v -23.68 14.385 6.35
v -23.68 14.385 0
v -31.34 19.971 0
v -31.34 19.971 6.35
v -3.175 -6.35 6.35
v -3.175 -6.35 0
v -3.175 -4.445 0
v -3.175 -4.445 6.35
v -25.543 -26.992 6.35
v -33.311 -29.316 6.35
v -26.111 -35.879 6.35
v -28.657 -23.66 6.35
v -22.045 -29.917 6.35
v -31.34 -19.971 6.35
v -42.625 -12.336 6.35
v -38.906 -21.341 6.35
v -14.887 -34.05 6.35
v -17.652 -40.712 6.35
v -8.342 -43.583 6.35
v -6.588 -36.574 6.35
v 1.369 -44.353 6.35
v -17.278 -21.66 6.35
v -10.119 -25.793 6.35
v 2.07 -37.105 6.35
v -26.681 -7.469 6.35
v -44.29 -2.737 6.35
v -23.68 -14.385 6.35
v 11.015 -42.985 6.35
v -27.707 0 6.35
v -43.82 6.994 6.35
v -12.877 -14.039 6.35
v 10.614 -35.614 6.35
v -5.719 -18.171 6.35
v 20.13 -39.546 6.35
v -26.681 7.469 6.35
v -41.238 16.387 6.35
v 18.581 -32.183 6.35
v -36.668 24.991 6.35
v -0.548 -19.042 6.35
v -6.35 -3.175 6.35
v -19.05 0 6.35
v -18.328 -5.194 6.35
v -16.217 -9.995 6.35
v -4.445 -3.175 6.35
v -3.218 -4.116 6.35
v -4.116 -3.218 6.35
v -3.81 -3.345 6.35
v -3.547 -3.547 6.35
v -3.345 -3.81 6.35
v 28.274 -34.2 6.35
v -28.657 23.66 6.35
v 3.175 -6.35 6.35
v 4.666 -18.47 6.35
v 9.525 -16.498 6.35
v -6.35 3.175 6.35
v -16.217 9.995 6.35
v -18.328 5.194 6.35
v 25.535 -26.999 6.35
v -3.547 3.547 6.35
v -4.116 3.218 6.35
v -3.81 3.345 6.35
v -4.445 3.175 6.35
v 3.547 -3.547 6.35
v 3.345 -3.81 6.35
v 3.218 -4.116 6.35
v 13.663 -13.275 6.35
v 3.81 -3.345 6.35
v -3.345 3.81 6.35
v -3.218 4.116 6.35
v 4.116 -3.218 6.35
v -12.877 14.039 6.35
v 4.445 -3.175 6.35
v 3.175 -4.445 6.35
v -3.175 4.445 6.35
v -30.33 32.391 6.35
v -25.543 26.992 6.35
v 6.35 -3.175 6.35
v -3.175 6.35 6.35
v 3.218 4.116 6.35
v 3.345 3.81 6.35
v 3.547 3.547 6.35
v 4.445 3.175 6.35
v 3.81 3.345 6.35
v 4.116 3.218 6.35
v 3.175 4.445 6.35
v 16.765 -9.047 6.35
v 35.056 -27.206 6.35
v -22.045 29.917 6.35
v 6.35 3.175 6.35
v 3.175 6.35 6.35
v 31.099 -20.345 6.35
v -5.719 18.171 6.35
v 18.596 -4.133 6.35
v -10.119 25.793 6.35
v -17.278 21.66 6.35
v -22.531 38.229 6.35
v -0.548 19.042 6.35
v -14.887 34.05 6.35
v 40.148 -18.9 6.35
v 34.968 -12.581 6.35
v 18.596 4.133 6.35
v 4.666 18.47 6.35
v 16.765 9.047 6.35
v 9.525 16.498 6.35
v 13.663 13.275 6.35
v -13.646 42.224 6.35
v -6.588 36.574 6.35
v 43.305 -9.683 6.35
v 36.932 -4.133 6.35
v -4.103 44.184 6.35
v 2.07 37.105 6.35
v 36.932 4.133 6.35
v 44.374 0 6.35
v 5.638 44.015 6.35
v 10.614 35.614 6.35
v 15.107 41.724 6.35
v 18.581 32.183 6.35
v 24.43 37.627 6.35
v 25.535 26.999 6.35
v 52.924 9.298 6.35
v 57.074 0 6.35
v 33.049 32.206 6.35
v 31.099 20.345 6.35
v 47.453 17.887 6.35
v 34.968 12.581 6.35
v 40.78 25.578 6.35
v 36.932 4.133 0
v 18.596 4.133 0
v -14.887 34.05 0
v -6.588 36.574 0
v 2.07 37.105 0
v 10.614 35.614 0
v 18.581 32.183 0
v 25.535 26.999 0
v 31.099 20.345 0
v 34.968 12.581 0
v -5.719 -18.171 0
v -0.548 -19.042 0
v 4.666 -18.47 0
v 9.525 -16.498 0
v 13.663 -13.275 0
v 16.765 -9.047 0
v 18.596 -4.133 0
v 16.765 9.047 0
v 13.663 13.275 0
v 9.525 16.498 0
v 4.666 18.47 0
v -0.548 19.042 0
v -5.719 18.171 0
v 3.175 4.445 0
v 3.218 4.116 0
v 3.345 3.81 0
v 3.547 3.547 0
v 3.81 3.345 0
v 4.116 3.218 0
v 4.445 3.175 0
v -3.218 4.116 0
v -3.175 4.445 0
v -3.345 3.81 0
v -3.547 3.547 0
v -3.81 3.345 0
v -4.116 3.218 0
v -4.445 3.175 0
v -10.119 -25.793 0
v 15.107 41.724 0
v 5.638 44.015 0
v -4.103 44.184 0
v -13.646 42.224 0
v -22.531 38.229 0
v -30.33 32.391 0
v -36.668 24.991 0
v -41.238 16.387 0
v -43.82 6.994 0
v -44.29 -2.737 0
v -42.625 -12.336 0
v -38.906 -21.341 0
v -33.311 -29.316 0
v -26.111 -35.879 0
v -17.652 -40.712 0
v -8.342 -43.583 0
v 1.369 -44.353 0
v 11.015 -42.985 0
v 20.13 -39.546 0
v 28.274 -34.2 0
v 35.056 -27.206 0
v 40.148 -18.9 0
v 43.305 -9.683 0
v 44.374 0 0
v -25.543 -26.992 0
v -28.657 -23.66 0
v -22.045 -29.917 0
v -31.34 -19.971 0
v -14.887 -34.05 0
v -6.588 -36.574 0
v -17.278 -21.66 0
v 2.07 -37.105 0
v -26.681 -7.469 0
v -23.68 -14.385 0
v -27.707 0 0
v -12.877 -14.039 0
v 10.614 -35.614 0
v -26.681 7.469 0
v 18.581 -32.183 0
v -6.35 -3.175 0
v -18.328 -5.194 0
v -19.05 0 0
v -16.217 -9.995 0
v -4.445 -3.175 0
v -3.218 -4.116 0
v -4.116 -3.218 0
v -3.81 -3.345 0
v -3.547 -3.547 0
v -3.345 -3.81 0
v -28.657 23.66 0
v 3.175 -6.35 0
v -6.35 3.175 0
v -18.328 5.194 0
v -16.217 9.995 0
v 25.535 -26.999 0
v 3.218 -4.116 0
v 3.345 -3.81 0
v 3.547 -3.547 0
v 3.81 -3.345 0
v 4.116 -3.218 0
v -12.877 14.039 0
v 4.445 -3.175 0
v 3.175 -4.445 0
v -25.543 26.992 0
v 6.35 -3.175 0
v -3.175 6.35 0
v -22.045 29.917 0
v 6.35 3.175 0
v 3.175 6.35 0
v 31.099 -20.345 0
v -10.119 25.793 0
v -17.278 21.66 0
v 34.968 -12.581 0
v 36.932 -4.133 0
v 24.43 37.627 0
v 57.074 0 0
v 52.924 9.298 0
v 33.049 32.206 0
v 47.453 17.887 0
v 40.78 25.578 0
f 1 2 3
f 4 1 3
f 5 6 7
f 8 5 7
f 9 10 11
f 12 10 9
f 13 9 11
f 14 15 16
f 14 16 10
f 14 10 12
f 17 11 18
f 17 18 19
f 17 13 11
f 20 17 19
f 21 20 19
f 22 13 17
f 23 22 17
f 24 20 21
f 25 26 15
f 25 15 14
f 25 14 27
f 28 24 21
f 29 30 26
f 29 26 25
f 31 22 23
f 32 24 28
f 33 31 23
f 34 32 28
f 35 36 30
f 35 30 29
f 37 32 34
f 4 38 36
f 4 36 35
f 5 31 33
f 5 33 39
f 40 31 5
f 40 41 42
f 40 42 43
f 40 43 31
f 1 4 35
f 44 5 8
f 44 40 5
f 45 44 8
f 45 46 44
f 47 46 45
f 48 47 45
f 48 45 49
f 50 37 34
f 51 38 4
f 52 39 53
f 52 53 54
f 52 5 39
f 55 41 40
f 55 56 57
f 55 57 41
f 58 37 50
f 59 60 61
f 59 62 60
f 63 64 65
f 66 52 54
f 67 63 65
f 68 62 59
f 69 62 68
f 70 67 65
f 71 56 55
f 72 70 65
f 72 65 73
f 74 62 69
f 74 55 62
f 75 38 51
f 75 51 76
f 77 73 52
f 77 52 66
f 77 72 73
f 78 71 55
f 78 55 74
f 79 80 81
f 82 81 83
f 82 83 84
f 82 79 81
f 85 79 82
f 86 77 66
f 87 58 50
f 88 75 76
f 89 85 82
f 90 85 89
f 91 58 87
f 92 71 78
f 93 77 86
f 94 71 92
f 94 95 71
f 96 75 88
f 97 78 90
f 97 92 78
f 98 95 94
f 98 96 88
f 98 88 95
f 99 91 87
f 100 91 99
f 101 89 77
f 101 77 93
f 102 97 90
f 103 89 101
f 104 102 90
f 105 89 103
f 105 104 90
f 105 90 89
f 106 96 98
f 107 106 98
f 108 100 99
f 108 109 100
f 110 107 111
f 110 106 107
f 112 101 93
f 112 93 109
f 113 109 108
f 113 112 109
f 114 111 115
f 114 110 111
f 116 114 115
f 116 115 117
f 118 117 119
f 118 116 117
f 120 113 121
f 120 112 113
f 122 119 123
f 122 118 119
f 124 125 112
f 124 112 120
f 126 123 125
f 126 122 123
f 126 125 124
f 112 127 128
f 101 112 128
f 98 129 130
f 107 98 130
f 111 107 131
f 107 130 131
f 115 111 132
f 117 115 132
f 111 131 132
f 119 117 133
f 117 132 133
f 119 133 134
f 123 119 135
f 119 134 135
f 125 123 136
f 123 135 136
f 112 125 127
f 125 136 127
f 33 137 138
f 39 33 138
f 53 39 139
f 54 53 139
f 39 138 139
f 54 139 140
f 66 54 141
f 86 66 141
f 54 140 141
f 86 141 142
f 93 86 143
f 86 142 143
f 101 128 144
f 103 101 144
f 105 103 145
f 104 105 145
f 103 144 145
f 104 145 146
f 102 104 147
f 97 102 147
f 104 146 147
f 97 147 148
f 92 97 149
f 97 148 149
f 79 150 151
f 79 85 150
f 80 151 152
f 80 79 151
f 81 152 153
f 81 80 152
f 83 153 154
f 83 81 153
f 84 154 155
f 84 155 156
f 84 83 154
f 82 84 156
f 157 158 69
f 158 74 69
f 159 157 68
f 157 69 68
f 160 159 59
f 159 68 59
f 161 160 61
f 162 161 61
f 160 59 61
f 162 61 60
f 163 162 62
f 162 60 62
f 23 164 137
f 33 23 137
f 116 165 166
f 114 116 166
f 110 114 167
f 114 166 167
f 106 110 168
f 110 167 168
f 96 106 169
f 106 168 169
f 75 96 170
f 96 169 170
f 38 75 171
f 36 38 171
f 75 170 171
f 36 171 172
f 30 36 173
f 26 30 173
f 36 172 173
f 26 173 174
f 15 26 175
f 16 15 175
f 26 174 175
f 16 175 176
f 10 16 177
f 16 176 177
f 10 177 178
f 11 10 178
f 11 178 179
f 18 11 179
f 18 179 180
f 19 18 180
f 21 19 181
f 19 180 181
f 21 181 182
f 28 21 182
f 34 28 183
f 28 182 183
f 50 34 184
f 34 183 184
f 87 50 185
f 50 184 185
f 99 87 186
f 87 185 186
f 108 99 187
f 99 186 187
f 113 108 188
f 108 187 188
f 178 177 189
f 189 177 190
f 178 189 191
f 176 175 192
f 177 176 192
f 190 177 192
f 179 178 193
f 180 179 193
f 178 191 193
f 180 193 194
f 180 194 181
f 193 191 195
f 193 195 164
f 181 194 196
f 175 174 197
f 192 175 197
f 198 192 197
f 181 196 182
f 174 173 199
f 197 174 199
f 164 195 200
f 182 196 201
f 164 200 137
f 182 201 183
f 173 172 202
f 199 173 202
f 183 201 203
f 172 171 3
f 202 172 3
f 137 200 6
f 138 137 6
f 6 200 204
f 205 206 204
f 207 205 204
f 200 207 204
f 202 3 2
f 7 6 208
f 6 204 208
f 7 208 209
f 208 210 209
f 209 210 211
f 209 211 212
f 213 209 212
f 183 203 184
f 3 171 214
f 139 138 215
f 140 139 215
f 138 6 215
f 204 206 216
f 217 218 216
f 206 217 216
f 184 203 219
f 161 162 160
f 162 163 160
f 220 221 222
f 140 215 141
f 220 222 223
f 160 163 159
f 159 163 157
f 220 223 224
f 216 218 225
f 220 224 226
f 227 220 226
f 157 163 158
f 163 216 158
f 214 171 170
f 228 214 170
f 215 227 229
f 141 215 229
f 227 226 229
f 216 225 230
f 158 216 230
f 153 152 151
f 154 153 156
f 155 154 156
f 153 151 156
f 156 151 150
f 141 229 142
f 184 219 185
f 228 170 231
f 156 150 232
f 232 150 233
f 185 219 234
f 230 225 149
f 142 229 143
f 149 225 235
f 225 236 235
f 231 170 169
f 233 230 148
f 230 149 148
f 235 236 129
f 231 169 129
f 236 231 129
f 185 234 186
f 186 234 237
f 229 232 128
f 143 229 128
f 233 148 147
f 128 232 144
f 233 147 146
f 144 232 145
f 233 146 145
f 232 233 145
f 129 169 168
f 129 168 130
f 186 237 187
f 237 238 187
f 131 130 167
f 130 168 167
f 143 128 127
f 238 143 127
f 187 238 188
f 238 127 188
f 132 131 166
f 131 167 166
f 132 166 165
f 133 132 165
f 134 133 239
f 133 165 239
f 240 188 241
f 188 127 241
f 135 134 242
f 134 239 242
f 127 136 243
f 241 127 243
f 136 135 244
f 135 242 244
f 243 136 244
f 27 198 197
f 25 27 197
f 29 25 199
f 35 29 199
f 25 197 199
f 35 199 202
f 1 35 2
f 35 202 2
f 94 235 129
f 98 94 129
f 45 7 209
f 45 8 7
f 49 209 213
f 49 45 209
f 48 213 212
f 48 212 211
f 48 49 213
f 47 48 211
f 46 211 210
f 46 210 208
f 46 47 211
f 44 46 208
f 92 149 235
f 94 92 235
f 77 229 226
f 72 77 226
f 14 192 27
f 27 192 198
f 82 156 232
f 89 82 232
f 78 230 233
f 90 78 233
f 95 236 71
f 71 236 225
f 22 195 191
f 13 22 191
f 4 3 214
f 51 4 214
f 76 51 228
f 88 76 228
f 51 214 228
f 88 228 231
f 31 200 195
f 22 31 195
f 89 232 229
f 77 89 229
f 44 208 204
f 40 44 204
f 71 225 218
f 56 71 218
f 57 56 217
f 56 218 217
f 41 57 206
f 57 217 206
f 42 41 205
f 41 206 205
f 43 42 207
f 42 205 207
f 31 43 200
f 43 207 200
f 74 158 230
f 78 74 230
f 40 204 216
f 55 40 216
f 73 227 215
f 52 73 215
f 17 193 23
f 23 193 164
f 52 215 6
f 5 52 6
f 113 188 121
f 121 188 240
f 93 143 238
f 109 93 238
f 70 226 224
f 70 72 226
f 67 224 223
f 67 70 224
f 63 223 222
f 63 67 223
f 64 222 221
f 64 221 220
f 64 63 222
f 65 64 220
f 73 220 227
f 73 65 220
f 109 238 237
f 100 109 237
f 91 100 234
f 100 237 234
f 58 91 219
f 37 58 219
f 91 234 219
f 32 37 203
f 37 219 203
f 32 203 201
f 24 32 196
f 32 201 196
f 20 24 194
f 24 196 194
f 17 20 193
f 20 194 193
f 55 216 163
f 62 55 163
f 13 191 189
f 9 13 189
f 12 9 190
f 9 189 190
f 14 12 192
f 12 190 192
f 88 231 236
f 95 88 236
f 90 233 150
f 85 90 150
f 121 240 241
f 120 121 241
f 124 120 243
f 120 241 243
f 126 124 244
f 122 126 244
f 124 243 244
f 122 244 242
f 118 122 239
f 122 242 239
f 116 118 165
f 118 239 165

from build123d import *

# Parameters (mm, degrees)
F1_DEPTH = 6.35
F2_R     = 1.27


with BuildPart() as f1:
    # F0 (on Top) → F1 (new body)
    with BuildSketch(Plane.XY):
        with BuildLine():
            ThreePointArc((15.1071694838, 41.7235677075), (-36.3280432516, -25.4824634909), (44.3743470042, 0))
            ThreePointArc((44.3743470042, 0), (36.3280432516, 25.4824634909), (15.1071694838, 41.7235677075))
        make_face()
        with BuildLine():
            ThreePointArc((-14.8868357383, 34.0501787057), (18.5811231374, 32.1834493357), (36.9317376317, 4.1327114215))
            ThreePointArc((36.9317376317, 4.1327114215), (37.1045743636, 2.0695674625), (37.1622462748, 0))
            ThreePointArc((37.1622462748, 0), (37.1045743636, -2.0695674625), (36.9317376317, -4.1327114215))
            ThreePointArc((36.9317376317, -4.1327114215), (18.5811231374, -32.1834493357), (-14.8868357383, -34.0501787057))
            ThreePointArc((-14.8868357383, -34.0501787057), (-18.5811231374, -32.1834493357), (-22.0449018934, -29.9174672842))
            ThreePointArc((-22.0449018934, -29.9174672842), (-27.1515852785, -25.3736864695), (-31.3396552702, -19.9714435065))
            ThreePointArc((-31.3396552702, -19.9714435065), (-37.1622462748, 0), (-31.3396552702, 19.9714435065))
            ThreePointArc((-31.3396552702, 19.9714435065), (-27.1515852785, 25.3736864695), (-22.0449018934, 29.9174672842))
            ThreePointArc((-22.0449018934, 29.9174672842), (-18.5811231374, 32.1834493357), (-14.8868357383, 34.0501787057))
        make_face(mode=Mode.SUBTRACT)
        with BuildLine():
            ThreePointArc((15.1071694838, 41.7235677075), (36.3280432516, 25.4824634909), (44.3743470042, 0))
            Line((44.3743470042, 0), (57.0743470042, 0))
            ThreePointArc((57.0743470042, 0), (40.7796227308, 25.5780250359), (15.1071694838, 41.7235677075))
        make_face()
        with BuildLine():
            ThreePointArc((-9.525, 16.4977839421), (-7.6678534057, 17.4386502961), (-5.7191279813, 18.1712430817))
            Line((-5.7191279813, 18.1712430817), (-10.11946405, 25.792848723))
            ThreePointArc((-10.11946405, 25.792848723), (-13.8534706654, 23.9949150536), (-17.2775302051, 21.6601373015))
            Line((-17.2775302051, 21.6601373015), (-12.8771941364, 14.0385316602))
            ThreePointArc((-12.8771941364, 14.0385316602), (-11.2683874613, 15.3598809898), (-9.525, 16.4977839421))
        make_face()
        with BuildLine():
            ThreePointArc((-17.2775302051, 21.6601373015), (-13.8534706654, 23.9949150536), (-10.11946405, 25.792848723))
            Line((-10.11946405, 25.792848723), (-14.8868357383, 34.0501787057))
            ThreePointArc((-14.8868357383, 34.0501787057), (-18.5811231374, 32.1834493357), (-22.0449018934, 29.9174672842))
            Line((-22.0449018934, 29.9174672842), (-17.2775302051, 21.6601373015))
        make_face()
        with BuildLine():
            Line((-10.11946405, -25.792848723), (-5.7191279813, -18.1712430817))
            ThreePointArc((-5.7191279813, -18.1712430817), (-7.6678534057, -17.4386502961), (-9.525, -16.4977839421))
            ThreePointArc((-9.525, -16.4977839421), (-11.2683874613, -15.3598809898), (-12.8771941364, -14.0385316602))
            Line((-12.8771941364, -14.0385316602), (-17.2775302051, -21.6601373015))
            ThreePointArc((-17.2775302051, -21.6601373015), (-13.8534706654, -23.9949150536), (-10.11946405, -25.792848723))
        make_face()
        with BuildLine():
            Line((-14.8868357383, -34.0501787057), (-10.11946405, -25.792848723))
            ThreePointArc((-10.11946405, -25.792848723), (-13.8534706654, -23.9949150536), (-17.2775302051, -21.6601373015))
            Line((-17.2775302051, -21.6601373015), (-22.0449018934, -29.9174672842))
            ThreePointArc((-22.0449018934, -29.9174672842), (-18.5811231374, -32.1834493357), (-14.8868357383, -34.0501787057))
        make_face()
        with BuildLine():
            ThreePointArc((18.5963221177, 4.1327114215), (18.936240867, 2.0787693062), (19.05, 0))
            ThreePointArc((19.05, 0), (18.936240867, -2.0787693062), (18.5963221177, -4.1327114215))
            Line((18.5963221177, -4.1327114215), (27.3969942551, -4.1327114215))
            ThreePointArc((27.3969942551, -4.1327114215), (27.6293459059, -2.0721589516), (27.7069413308, 0))
            ThreePointArc((27.7069413308, 0), (27.6293459059, 2.0721589516), (27.3969942551, 4.1327114215))
            Line((27.3969942551, 4.1327114215), (18.5963221177, 4.1327114215))
        make_face()
        with BuildLine():
            Line((36.9317376317, 4.1327114215), (27.3969942551, 4.1327114215))
            ThreePointArc((27.3969942551, 4.1327114215), (27.6293459059, 2.0721589516), (27.7069413308, 0))
            ThreePointArc((27.7069413308, 0), (27.6293459059, -2.0721589516), (27.3969942551, -4.1327114215))
            Line((27.3969942551, -4.1327114215), (36.9317376317, -4.1327114215))
            ThreePointArc((36.9317376317, -4.1327114215), (37.1045743636, -2.0695674625), (37.1622462748, 0))
            ThreePointArc((37.1622462748, 0), (37.1045743636, 2.0695674625), (36.9317376317, 4.1327114215))
        make_face()
        with BuildLine():
            ThreePointArc((18.5963221177, -4.1327114215), (18.936240867, -2.0787693062), (19.05, 0))
            ThreePointArc((19.05, 0), (18.936240867, 2.0787693062), (18.5963221177, 4.1327114215))
            ThreePointArc((18.5963221177, 4.1327114215), (9.525, 16.4977839421), (-5.7191279813, 18.1712430817))
            ThreePointArc((-5.7191279813, 18.1712430817), (-7.6678534057, 17.4386502961), (-9.525, 16.4977839421))
            ThreePointArc((-9.525, 16.4977839421), (-11.2683874613, 15.3598809898), (-12.8771941364, 14.0385316602))
            ThreePointArc((-12.8771941364, 14.0385316602), (-19.05, 0), (-12.8771941364, -14.0385316602))
            ThreePointArc((-12.8771941364, -14.0385316602), (-11.2683874613, -15.3598809898), (-9.525, -16.4977839421))
            ThreePointArc((-9.525, -16.4977839421), (-7.6678534057, -17.4386502961), (-5.7191279813, -18.1712430817))
            ThreePointArc((-5.7191279813, -18.1712430817), (9.525, -16.4977839421), (18.5963221177, -4.1327114215))
        make_face()
        Polygon((-3.175, 6.35), (3.175, 6.35), (3.175, 3.175), (6.35, 3.175), (6.35, -3.175), (3.175, -3.175), (3.175, -6.35), (-3.175, -6.35), (-3.175, -3.175), (-6.35, -3.175), (-6.35, 3.175), (-3.175, 3.175), align=None, mode=Mode.SUBTRACT)
        with BuildLine():
            ThreePointArc((-23.6801005032, -14.3849726474), (-27.7069413308, 0), (-23.6801005032, 14.3849726474))
            Line((-23.6801005032, 14.3849726474), (-31.3396552702, 19.9714435065))
            ThreePointArc((-31.3396552702, 19.9714435065), (-37.1622462748, 0), (-31.3396552702, -19.9714435065))
            Line((-31.3396552702, -19.9714435065), (-23.6801005032, -14.3849726474))
        make_face()
    extrude(amount=F1_DEPTH)

    # F2
    f2_edges = [f1.edges().sort_by_distance(p)[0] for p in [
        (-3.175, 3.175, 3.175),
        (-3.175, -3.175, 3.175),
        (3.175, -3.175, 3.175),
        (3.175, 3.175, 3.175),
    ]]
    fillet(f2_edges, radius=F2_R)


solid = f1.part
